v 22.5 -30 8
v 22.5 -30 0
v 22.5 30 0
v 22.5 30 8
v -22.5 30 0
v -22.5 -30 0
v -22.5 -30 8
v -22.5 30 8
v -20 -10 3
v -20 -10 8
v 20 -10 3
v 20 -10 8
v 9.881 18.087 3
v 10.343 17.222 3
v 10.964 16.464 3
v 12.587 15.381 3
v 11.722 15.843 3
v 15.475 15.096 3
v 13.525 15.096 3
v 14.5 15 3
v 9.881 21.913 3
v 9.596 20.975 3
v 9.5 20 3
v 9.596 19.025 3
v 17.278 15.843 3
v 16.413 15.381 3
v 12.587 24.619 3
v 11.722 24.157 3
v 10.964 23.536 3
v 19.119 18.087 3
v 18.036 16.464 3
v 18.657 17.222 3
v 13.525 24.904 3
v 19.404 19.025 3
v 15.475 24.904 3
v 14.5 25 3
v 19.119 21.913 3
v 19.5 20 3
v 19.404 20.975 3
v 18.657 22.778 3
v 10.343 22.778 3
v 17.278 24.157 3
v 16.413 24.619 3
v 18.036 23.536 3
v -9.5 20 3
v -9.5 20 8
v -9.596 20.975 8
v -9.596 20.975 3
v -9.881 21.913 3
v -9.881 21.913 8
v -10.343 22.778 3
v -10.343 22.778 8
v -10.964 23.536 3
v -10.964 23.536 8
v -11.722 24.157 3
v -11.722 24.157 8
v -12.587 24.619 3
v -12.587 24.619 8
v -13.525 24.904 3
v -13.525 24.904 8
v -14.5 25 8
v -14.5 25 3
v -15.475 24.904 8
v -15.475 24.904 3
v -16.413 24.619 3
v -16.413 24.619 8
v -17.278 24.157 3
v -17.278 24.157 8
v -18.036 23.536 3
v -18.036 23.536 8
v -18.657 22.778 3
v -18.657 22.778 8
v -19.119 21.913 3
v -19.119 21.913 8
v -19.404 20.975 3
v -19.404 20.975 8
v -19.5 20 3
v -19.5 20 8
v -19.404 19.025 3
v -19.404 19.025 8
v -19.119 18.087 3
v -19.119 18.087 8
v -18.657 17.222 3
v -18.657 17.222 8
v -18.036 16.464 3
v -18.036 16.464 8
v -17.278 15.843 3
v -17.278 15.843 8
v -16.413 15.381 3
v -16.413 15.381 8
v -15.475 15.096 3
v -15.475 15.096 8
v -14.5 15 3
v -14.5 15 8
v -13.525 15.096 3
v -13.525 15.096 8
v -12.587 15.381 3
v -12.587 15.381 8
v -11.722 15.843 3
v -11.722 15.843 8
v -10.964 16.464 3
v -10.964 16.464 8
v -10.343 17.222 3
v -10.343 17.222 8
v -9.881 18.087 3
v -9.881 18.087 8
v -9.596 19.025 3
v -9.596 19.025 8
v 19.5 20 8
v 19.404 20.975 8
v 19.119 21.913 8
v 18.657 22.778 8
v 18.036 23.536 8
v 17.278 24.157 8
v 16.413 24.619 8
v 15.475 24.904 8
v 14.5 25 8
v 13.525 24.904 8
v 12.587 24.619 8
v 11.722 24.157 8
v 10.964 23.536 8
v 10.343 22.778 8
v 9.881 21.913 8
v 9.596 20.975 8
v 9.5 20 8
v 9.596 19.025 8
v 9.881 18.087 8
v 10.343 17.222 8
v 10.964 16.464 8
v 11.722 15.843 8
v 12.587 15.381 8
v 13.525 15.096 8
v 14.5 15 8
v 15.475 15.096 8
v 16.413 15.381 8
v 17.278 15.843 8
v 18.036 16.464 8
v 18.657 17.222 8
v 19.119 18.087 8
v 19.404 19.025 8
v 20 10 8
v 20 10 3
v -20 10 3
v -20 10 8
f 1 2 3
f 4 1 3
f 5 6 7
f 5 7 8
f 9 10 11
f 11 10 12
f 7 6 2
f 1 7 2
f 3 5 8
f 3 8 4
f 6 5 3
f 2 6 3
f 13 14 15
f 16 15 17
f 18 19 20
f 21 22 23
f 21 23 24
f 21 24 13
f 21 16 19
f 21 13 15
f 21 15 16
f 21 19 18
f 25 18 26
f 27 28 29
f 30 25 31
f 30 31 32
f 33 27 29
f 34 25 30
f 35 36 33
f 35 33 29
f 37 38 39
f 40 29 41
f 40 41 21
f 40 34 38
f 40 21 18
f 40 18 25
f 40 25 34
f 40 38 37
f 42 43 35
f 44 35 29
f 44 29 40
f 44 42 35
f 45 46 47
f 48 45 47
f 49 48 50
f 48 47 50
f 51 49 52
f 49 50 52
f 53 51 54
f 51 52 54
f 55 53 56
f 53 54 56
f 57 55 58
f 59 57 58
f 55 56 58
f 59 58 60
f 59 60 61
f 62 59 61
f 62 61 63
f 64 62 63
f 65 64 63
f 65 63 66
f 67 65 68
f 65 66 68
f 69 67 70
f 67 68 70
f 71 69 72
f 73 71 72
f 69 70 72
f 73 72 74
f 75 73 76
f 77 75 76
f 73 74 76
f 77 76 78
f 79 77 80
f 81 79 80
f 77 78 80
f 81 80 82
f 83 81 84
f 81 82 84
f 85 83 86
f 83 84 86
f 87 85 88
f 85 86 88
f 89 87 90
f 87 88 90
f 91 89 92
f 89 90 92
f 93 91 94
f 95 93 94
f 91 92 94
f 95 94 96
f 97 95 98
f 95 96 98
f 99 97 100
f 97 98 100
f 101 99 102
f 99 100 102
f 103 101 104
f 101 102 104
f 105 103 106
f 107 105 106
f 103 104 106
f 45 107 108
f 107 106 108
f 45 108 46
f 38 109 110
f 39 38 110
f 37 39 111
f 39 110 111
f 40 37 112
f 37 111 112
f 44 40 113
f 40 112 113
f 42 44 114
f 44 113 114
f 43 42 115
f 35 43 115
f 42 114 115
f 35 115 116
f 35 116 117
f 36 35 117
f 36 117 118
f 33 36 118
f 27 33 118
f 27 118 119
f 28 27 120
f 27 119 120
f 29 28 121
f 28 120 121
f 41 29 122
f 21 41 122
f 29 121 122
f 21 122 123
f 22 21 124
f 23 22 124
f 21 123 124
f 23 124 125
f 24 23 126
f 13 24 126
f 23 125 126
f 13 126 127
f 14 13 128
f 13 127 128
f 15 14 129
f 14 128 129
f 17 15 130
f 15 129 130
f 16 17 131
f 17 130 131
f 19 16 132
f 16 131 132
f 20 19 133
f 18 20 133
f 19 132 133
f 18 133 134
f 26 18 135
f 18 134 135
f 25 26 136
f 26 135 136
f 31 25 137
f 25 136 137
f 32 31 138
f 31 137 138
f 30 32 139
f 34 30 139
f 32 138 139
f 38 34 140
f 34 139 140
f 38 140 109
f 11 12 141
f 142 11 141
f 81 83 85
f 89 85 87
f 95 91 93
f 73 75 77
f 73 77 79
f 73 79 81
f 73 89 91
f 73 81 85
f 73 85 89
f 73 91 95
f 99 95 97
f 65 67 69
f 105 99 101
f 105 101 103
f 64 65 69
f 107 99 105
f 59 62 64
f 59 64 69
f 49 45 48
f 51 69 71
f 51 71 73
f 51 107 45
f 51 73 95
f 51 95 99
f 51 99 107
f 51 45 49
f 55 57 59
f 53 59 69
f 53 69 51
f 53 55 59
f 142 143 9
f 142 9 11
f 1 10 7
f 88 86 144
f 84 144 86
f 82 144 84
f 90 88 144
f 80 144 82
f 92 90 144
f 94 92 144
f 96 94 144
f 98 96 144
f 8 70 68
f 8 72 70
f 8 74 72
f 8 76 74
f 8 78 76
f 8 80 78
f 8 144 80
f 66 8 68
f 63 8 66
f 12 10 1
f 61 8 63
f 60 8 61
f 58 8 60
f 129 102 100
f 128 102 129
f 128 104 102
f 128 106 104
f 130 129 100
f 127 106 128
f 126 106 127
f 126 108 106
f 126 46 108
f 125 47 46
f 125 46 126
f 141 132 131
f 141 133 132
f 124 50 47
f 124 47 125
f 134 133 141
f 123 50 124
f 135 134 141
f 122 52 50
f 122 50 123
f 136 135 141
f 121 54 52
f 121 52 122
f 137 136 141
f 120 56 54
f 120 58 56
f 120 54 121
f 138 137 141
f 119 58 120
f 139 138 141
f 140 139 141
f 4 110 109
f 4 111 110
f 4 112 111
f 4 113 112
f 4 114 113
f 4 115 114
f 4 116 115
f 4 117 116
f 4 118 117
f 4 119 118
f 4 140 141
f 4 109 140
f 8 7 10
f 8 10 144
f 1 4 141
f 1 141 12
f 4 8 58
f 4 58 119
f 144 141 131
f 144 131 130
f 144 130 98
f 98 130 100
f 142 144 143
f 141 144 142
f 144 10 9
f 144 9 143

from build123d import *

# Parameters (mm, degrees)
SKETCH1_W           = 45
SKETCH1_H           = 60
BOSS_EXTRUDE1_DEPTH = 8
SKETCH2_R           = 5
SKETCH2_W           = 40
SKETCH2_H           = 20
CUT_EXTRUDE1_DEPTH  = 5


with BuildPart() as part:
    # Sketch1 → Boss-Extrude1 (new body)
    with BuildSketch(Plane.XY):
        Rectangle(SKETCH1_W, SKETCH1_H)
    extrude(amount=BOSS_EXTRUDE1_DEPTH)

    # Sketch2 → Cut-Extrude1 (cut)
    with BuildSketch(Plane.XY.offset(8)):
        with Locations((-14.5, 20)):
            Circle(SKETCH2_R)
        with Locations((14.5, 20)):
            Circle(SKETCH2_R)
        Rectangle(SKETCH2_W, SKETCH2_H)
    extrude(amount=-CUT_EXTRUDE1_DEPTH, mode=Mode.SUBTRACT)


solid = part.part
